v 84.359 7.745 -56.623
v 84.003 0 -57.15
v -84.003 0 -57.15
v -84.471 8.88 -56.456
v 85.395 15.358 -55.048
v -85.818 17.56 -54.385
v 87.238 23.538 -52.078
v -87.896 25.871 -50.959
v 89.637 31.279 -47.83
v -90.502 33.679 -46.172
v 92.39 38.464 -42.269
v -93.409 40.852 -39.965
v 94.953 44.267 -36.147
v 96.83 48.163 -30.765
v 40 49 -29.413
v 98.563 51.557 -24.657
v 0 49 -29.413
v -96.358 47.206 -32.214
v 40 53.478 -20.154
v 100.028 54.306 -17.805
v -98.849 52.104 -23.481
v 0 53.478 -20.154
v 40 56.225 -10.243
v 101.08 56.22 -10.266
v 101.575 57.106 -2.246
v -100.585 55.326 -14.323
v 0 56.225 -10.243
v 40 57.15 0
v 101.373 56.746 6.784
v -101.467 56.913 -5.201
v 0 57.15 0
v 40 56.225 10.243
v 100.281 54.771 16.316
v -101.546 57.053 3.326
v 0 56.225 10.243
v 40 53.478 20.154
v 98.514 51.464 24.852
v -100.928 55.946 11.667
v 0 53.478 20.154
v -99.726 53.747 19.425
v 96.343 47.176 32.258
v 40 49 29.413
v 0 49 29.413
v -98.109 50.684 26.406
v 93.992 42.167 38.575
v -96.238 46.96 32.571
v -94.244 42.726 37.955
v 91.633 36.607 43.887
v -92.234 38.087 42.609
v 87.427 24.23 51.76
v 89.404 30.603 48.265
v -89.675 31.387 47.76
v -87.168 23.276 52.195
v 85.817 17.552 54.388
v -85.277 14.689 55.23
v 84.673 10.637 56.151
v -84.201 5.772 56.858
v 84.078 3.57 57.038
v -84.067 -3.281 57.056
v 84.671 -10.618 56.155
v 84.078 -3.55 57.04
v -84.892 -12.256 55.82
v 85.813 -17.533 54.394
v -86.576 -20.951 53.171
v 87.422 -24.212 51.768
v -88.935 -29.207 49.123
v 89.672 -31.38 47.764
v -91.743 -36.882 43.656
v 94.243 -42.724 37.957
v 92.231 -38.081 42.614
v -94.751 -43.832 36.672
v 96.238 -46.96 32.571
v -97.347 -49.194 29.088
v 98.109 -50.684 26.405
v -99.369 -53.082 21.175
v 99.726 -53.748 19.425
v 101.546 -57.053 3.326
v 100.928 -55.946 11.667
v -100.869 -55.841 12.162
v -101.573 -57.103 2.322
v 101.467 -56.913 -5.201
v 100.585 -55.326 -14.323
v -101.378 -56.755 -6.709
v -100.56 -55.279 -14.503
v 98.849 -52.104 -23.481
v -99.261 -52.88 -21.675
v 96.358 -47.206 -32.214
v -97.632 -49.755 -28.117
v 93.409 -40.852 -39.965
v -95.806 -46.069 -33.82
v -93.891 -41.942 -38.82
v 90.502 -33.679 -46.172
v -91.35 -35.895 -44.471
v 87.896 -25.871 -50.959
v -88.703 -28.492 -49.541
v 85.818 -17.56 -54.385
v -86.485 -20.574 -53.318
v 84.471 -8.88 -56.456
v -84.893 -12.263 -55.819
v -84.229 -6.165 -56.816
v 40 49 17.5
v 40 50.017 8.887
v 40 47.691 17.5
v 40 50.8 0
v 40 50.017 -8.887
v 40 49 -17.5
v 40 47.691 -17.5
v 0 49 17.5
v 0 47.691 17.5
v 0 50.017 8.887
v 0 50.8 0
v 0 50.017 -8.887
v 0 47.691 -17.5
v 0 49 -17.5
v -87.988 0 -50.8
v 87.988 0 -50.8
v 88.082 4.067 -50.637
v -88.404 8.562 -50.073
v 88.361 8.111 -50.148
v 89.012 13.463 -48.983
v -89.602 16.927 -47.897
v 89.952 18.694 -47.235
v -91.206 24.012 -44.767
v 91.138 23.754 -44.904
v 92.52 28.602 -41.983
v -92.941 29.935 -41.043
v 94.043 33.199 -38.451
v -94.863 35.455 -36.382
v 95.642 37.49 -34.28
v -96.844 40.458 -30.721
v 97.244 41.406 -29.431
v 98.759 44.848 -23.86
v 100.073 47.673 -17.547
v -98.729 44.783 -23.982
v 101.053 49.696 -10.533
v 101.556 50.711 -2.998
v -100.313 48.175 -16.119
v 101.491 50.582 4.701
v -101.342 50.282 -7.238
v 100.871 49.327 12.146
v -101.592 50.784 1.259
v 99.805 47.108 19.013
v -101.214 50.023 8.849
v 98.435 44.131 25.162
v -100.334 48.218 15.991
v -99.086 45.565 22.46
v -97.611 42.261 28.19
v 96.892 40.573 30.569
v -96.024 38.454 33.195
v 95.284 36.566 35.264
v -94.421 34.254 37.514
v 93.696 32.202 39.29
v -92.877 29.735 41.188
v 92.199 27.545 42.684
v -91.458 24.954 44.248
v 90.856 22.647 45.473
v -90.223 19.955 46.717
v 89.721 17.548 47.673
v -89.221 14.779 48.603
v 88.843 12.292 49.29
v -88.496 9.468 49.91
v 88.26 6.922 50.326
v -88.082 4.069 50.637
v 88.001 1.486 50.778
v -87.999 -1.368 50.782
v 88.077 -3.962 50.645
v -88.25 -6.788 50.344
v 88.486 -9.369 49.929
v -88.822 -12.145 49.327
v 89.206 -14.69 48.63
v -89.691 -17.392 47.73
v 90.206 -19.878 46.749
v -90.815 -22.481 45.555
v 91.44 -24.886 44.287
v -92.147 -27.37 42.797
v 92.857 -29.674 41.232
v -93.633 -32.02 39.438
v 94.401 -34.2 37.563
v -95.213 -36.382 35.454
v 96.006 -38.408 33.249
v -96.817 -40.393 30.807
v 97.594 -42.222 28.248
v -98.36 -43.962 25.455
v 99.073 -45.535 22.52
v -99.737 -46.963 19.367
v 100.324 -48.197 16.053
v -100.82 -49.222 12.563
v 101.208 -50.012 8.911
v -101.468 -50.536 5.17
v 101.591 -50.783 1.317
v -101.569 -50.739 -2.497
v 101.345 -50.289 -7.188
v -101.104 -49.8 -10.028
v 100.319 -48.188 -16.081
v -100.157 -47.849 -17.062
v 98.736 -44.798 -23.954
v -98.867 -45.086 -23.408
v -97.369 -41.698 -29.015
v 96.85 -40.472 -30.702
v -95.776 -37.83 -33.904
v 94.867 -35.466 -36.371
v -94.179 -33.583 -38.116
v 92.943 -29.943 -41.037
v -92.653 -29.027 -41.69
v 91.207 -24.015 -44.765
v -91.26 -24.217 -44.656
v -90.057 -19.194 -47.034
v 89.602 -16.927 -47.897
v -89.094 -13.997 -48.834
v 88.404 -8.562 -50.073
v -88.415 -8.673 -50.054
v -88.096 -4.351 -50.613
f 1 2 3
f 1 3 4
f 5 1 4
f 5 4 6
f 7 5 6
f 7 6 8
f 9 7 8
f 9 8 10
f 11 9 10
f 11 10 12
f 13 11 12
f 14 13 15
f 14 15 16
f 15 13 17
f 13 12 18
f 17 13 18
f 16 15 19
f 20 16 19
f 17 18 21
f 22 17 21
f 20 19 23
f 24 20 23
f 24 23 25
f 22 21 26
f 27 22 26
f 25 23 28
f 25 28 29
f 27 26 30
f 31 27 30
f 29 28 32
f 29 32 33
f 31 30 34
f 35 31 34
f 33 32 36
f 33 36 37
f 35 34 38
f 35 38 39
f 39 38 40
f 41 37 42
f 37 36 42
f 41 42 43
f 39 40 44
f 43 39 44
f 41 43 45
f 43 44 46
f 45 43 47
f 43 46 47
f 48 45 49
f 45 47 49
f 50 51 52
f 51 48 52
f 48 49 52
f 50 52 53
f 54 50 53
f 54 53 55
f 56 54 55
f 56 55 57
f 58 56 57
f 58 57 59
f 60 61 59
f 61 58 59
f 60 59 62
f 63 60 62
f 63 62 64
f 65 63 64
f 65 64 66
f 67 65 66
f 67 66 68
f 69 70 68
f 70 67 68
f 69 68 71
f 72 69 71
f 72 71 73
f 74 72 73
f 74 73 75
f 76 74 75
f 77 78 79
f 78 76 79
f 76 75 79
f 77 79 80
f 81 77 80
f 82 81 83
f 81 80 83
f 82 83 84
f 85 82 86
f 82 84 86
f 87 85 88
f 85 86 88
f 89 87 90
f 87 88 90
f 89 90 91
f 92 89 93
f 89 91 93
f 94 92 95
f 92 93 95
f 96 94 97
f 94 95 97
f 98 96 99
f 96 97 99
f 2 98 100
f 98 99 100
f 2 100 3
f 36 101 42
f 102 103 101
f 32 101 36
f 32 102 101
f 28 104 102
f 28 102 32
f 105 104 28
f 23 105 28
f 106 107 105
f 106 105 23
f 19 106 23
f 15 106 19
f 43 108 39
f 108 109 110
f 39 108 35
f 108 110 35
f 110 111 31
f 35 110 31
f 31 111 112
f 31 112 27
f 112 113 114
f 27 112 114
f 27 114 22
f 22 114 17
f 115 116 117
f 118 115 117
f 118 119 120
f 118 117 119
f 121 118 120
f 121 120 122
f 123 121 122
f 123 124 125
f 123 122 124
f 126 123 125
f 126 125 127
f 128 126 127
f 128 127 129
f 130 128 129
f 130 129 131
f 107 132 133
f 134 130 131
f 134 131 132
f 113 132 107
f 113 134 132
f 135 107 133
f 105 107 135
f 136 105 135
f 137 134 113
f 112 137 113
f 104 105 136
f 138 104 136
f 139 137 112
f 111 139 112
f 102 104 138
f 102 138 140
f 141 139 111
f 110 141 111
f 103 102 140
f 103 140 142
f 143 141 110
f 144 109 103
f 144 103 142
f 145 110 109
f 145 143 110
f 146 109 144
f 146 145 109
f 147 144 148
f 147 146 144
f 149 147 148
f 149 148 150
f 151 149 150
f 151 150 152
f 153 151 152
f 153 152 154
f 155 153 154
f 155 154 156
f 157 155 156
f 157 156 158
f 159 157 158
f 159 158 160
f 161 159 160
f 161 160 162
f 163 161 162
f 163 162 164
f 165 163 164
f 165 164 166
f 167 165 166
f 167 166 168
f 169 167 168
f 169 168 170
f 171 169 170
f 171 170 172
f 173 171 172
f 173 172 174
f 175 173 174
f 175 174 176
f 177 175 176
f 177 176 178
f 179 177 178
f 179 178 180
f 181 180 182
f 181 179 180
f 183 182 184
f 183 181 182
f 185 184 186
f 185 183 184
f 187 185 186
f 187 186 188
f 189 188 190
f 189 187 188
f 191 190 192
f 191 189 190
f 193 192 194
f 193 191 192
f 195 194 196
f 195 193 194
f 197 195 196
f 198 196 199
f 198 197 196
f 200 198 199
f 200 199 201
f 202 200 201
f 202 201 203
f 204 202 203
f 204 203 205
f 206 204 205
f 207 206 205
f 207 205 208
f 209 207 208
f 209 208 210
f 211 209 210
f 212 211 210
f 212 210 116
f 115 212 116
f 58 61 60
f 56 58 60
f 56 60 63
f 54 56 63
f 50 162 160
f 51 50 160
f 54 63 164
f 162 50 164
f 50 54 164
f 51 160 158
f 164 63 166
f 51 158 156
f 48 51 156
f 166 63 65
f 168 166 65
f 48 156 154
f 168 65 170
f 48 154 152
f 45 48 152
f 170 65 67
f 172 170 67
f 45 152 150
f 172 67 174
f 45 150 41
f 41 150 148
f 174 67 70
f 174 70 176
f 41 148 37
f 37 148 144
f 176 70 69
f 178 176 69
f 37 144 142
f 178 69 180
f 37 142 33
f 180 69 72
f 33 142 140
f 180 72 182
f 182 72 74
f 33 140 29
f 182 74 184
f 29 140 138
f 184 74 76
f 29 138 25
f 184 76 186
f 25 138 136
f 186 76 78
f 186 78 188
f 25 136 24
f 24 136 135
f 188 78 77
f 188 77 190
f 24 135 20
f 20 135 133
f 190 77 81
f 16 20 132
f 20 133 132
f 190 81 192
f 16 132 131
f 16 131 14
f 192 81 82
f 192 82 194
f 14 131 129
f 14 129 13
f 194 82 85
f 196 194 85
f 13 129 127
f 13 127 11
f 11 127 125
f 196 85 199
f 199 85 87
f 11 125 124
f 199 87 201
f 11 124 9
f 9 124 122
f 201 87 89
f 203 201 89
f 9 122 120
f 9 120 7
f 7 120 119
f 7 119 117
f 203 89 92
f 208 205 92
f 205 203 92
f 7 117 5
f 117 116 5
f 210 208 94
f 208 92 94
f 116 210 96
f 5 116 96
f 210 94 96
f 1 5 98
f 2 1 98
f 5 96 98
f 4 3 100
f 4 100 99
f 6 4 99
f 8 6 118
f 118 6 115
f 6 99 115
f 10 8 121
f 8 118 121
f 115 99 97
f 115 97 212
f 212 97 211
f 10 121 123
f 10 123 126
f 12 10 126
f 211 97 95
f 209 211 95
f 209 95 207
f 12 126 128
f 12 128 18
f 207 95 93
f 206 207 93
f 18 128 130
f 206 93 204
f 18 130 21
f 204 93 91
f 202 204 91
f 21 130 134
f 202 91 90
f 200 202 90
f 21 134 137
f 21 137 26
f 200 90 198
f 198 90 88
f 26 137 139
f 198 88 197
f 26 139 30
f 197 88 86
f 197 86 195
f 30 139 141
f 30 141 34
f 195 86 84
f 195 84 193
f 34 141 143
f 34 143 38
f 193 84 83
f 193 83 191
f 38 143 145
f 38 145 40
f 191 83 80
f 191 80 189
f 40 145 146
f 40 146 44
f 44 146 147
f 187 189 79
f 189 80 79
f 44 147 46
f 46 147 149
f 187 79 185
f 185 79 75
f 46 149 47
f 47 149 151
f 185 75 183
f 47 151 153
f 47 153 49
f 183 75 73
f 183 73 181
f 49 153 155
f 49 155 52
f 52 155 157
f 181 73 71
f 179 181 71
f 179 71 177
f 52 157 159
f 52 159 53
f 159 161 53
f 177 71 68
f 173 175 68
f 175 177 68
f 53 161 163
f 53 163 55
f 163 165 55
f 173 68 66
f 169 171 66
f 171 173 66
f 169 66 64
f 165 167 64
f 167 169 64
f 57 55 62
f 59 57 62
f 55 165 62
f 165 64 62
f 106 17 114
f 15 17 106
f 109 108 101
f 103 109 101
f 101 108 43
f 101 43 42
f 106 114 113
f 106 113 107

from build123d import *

# Parameters (mm, degrees)
BOSS_EXTRUDE1_DEPTH      = 101.6
BOSS_EXTRUDE1_DEPTH_BACK = 101.6
SKETCH1_R                = 57.15
SKETCH1_R_2              = 50.8
CUT_EXTRUDE3_DEPTH       = 130.826056707
CUT_EXTRUDE3_DEPTH_BACK  = 130.826056707
SKETCH3_W                = 40
SKETCH3_H                = 10
SKETCH5_W                = 40
SKETCH5_H                = 35
CUT_EXTRUDE5_DEPTH       = 18.15
CUT_EXTRUDE6_DEPTH       = 130.826056707
CUT_EXTRUDE6_DEPTH_BACK  = 130.826056707
SKETCH6_W                = 252.16572489
SKETCH6_H                = 244.887597008
SKETCH6_R                = 101.6


with BuildPart() as part:
    # Sketch1 → Boss-Extrude1 (new, two sides: drawn at the far end of the back side and taken through both)
    with BuildSketch(Plane(origin=(0, 0, 0), x_dir=(0, 0, -1), z_dir=(1, 0, 0)).offset(-BOSS_EXTRUDE1_DEPTH_BACK)):
        Circle(SKETCH1_R)
        Circle(SKETCH1_R_2, mode=Mode.SUBTRACT)
    extrude(amount=BOSS_EXTRUDE1_DEPTH + BOSS_EXTRUDE1_DEPTH_BACK)

    # Sketch3 → Cut-Extrude3 (cut, two sides: drawn at the far end of the back side and taken through both)
    with BuildSketch(Plane.XY.offset(-CUT_EXTRUDE3_DEPTH_BACK)):
        with Locations((20, 54)):
            Rectangle(SKETCH3_W, SKETCH3_H)
    extrude(amount=CUT_EXTRUDE3_DEPTH + CUT_EXTRUDE3_DEPTH_BACK, mode=Mode.SUBTRACT)

    # Sketch5 → Cut-Extrude5 (cut)
    with BuildSketch(Plane(origin=(0, 49, 0), x_dir=(1, 0, 0), z_dir=(0, 1, 0))):
        with Locations((20, 0)):
            Rectangle(SKETCH5_W, SKETCH5_H)
    extrude(amount=-CUT_EXTRUDE5_DEPTH, mode=Mode.SUBTRACT)

    # Sketch6 → Cut-Extrude6 (cut, two sides: drawn at the far end of the back side and taken through both)
    with BuildSketch(Plane(origin=(0, 0, 0), x_dir=(1, 0, 0), z_dir=(0, 1, 0)).offset(-CUT_EXTRUDE6_DEPTH_BACK)):
        Rectangle(SKETCH6_W, SKETCH6_H)
        Circle(SKETCH6_R, mode=Mode.SUBTRACT)
    extrude(amount=CUT_EXTRUDE6_DEPTH + CUT_EXTRUDE6_DEPTH_BACK, mode=Mode.SUBTRACT)


solid = part.part
